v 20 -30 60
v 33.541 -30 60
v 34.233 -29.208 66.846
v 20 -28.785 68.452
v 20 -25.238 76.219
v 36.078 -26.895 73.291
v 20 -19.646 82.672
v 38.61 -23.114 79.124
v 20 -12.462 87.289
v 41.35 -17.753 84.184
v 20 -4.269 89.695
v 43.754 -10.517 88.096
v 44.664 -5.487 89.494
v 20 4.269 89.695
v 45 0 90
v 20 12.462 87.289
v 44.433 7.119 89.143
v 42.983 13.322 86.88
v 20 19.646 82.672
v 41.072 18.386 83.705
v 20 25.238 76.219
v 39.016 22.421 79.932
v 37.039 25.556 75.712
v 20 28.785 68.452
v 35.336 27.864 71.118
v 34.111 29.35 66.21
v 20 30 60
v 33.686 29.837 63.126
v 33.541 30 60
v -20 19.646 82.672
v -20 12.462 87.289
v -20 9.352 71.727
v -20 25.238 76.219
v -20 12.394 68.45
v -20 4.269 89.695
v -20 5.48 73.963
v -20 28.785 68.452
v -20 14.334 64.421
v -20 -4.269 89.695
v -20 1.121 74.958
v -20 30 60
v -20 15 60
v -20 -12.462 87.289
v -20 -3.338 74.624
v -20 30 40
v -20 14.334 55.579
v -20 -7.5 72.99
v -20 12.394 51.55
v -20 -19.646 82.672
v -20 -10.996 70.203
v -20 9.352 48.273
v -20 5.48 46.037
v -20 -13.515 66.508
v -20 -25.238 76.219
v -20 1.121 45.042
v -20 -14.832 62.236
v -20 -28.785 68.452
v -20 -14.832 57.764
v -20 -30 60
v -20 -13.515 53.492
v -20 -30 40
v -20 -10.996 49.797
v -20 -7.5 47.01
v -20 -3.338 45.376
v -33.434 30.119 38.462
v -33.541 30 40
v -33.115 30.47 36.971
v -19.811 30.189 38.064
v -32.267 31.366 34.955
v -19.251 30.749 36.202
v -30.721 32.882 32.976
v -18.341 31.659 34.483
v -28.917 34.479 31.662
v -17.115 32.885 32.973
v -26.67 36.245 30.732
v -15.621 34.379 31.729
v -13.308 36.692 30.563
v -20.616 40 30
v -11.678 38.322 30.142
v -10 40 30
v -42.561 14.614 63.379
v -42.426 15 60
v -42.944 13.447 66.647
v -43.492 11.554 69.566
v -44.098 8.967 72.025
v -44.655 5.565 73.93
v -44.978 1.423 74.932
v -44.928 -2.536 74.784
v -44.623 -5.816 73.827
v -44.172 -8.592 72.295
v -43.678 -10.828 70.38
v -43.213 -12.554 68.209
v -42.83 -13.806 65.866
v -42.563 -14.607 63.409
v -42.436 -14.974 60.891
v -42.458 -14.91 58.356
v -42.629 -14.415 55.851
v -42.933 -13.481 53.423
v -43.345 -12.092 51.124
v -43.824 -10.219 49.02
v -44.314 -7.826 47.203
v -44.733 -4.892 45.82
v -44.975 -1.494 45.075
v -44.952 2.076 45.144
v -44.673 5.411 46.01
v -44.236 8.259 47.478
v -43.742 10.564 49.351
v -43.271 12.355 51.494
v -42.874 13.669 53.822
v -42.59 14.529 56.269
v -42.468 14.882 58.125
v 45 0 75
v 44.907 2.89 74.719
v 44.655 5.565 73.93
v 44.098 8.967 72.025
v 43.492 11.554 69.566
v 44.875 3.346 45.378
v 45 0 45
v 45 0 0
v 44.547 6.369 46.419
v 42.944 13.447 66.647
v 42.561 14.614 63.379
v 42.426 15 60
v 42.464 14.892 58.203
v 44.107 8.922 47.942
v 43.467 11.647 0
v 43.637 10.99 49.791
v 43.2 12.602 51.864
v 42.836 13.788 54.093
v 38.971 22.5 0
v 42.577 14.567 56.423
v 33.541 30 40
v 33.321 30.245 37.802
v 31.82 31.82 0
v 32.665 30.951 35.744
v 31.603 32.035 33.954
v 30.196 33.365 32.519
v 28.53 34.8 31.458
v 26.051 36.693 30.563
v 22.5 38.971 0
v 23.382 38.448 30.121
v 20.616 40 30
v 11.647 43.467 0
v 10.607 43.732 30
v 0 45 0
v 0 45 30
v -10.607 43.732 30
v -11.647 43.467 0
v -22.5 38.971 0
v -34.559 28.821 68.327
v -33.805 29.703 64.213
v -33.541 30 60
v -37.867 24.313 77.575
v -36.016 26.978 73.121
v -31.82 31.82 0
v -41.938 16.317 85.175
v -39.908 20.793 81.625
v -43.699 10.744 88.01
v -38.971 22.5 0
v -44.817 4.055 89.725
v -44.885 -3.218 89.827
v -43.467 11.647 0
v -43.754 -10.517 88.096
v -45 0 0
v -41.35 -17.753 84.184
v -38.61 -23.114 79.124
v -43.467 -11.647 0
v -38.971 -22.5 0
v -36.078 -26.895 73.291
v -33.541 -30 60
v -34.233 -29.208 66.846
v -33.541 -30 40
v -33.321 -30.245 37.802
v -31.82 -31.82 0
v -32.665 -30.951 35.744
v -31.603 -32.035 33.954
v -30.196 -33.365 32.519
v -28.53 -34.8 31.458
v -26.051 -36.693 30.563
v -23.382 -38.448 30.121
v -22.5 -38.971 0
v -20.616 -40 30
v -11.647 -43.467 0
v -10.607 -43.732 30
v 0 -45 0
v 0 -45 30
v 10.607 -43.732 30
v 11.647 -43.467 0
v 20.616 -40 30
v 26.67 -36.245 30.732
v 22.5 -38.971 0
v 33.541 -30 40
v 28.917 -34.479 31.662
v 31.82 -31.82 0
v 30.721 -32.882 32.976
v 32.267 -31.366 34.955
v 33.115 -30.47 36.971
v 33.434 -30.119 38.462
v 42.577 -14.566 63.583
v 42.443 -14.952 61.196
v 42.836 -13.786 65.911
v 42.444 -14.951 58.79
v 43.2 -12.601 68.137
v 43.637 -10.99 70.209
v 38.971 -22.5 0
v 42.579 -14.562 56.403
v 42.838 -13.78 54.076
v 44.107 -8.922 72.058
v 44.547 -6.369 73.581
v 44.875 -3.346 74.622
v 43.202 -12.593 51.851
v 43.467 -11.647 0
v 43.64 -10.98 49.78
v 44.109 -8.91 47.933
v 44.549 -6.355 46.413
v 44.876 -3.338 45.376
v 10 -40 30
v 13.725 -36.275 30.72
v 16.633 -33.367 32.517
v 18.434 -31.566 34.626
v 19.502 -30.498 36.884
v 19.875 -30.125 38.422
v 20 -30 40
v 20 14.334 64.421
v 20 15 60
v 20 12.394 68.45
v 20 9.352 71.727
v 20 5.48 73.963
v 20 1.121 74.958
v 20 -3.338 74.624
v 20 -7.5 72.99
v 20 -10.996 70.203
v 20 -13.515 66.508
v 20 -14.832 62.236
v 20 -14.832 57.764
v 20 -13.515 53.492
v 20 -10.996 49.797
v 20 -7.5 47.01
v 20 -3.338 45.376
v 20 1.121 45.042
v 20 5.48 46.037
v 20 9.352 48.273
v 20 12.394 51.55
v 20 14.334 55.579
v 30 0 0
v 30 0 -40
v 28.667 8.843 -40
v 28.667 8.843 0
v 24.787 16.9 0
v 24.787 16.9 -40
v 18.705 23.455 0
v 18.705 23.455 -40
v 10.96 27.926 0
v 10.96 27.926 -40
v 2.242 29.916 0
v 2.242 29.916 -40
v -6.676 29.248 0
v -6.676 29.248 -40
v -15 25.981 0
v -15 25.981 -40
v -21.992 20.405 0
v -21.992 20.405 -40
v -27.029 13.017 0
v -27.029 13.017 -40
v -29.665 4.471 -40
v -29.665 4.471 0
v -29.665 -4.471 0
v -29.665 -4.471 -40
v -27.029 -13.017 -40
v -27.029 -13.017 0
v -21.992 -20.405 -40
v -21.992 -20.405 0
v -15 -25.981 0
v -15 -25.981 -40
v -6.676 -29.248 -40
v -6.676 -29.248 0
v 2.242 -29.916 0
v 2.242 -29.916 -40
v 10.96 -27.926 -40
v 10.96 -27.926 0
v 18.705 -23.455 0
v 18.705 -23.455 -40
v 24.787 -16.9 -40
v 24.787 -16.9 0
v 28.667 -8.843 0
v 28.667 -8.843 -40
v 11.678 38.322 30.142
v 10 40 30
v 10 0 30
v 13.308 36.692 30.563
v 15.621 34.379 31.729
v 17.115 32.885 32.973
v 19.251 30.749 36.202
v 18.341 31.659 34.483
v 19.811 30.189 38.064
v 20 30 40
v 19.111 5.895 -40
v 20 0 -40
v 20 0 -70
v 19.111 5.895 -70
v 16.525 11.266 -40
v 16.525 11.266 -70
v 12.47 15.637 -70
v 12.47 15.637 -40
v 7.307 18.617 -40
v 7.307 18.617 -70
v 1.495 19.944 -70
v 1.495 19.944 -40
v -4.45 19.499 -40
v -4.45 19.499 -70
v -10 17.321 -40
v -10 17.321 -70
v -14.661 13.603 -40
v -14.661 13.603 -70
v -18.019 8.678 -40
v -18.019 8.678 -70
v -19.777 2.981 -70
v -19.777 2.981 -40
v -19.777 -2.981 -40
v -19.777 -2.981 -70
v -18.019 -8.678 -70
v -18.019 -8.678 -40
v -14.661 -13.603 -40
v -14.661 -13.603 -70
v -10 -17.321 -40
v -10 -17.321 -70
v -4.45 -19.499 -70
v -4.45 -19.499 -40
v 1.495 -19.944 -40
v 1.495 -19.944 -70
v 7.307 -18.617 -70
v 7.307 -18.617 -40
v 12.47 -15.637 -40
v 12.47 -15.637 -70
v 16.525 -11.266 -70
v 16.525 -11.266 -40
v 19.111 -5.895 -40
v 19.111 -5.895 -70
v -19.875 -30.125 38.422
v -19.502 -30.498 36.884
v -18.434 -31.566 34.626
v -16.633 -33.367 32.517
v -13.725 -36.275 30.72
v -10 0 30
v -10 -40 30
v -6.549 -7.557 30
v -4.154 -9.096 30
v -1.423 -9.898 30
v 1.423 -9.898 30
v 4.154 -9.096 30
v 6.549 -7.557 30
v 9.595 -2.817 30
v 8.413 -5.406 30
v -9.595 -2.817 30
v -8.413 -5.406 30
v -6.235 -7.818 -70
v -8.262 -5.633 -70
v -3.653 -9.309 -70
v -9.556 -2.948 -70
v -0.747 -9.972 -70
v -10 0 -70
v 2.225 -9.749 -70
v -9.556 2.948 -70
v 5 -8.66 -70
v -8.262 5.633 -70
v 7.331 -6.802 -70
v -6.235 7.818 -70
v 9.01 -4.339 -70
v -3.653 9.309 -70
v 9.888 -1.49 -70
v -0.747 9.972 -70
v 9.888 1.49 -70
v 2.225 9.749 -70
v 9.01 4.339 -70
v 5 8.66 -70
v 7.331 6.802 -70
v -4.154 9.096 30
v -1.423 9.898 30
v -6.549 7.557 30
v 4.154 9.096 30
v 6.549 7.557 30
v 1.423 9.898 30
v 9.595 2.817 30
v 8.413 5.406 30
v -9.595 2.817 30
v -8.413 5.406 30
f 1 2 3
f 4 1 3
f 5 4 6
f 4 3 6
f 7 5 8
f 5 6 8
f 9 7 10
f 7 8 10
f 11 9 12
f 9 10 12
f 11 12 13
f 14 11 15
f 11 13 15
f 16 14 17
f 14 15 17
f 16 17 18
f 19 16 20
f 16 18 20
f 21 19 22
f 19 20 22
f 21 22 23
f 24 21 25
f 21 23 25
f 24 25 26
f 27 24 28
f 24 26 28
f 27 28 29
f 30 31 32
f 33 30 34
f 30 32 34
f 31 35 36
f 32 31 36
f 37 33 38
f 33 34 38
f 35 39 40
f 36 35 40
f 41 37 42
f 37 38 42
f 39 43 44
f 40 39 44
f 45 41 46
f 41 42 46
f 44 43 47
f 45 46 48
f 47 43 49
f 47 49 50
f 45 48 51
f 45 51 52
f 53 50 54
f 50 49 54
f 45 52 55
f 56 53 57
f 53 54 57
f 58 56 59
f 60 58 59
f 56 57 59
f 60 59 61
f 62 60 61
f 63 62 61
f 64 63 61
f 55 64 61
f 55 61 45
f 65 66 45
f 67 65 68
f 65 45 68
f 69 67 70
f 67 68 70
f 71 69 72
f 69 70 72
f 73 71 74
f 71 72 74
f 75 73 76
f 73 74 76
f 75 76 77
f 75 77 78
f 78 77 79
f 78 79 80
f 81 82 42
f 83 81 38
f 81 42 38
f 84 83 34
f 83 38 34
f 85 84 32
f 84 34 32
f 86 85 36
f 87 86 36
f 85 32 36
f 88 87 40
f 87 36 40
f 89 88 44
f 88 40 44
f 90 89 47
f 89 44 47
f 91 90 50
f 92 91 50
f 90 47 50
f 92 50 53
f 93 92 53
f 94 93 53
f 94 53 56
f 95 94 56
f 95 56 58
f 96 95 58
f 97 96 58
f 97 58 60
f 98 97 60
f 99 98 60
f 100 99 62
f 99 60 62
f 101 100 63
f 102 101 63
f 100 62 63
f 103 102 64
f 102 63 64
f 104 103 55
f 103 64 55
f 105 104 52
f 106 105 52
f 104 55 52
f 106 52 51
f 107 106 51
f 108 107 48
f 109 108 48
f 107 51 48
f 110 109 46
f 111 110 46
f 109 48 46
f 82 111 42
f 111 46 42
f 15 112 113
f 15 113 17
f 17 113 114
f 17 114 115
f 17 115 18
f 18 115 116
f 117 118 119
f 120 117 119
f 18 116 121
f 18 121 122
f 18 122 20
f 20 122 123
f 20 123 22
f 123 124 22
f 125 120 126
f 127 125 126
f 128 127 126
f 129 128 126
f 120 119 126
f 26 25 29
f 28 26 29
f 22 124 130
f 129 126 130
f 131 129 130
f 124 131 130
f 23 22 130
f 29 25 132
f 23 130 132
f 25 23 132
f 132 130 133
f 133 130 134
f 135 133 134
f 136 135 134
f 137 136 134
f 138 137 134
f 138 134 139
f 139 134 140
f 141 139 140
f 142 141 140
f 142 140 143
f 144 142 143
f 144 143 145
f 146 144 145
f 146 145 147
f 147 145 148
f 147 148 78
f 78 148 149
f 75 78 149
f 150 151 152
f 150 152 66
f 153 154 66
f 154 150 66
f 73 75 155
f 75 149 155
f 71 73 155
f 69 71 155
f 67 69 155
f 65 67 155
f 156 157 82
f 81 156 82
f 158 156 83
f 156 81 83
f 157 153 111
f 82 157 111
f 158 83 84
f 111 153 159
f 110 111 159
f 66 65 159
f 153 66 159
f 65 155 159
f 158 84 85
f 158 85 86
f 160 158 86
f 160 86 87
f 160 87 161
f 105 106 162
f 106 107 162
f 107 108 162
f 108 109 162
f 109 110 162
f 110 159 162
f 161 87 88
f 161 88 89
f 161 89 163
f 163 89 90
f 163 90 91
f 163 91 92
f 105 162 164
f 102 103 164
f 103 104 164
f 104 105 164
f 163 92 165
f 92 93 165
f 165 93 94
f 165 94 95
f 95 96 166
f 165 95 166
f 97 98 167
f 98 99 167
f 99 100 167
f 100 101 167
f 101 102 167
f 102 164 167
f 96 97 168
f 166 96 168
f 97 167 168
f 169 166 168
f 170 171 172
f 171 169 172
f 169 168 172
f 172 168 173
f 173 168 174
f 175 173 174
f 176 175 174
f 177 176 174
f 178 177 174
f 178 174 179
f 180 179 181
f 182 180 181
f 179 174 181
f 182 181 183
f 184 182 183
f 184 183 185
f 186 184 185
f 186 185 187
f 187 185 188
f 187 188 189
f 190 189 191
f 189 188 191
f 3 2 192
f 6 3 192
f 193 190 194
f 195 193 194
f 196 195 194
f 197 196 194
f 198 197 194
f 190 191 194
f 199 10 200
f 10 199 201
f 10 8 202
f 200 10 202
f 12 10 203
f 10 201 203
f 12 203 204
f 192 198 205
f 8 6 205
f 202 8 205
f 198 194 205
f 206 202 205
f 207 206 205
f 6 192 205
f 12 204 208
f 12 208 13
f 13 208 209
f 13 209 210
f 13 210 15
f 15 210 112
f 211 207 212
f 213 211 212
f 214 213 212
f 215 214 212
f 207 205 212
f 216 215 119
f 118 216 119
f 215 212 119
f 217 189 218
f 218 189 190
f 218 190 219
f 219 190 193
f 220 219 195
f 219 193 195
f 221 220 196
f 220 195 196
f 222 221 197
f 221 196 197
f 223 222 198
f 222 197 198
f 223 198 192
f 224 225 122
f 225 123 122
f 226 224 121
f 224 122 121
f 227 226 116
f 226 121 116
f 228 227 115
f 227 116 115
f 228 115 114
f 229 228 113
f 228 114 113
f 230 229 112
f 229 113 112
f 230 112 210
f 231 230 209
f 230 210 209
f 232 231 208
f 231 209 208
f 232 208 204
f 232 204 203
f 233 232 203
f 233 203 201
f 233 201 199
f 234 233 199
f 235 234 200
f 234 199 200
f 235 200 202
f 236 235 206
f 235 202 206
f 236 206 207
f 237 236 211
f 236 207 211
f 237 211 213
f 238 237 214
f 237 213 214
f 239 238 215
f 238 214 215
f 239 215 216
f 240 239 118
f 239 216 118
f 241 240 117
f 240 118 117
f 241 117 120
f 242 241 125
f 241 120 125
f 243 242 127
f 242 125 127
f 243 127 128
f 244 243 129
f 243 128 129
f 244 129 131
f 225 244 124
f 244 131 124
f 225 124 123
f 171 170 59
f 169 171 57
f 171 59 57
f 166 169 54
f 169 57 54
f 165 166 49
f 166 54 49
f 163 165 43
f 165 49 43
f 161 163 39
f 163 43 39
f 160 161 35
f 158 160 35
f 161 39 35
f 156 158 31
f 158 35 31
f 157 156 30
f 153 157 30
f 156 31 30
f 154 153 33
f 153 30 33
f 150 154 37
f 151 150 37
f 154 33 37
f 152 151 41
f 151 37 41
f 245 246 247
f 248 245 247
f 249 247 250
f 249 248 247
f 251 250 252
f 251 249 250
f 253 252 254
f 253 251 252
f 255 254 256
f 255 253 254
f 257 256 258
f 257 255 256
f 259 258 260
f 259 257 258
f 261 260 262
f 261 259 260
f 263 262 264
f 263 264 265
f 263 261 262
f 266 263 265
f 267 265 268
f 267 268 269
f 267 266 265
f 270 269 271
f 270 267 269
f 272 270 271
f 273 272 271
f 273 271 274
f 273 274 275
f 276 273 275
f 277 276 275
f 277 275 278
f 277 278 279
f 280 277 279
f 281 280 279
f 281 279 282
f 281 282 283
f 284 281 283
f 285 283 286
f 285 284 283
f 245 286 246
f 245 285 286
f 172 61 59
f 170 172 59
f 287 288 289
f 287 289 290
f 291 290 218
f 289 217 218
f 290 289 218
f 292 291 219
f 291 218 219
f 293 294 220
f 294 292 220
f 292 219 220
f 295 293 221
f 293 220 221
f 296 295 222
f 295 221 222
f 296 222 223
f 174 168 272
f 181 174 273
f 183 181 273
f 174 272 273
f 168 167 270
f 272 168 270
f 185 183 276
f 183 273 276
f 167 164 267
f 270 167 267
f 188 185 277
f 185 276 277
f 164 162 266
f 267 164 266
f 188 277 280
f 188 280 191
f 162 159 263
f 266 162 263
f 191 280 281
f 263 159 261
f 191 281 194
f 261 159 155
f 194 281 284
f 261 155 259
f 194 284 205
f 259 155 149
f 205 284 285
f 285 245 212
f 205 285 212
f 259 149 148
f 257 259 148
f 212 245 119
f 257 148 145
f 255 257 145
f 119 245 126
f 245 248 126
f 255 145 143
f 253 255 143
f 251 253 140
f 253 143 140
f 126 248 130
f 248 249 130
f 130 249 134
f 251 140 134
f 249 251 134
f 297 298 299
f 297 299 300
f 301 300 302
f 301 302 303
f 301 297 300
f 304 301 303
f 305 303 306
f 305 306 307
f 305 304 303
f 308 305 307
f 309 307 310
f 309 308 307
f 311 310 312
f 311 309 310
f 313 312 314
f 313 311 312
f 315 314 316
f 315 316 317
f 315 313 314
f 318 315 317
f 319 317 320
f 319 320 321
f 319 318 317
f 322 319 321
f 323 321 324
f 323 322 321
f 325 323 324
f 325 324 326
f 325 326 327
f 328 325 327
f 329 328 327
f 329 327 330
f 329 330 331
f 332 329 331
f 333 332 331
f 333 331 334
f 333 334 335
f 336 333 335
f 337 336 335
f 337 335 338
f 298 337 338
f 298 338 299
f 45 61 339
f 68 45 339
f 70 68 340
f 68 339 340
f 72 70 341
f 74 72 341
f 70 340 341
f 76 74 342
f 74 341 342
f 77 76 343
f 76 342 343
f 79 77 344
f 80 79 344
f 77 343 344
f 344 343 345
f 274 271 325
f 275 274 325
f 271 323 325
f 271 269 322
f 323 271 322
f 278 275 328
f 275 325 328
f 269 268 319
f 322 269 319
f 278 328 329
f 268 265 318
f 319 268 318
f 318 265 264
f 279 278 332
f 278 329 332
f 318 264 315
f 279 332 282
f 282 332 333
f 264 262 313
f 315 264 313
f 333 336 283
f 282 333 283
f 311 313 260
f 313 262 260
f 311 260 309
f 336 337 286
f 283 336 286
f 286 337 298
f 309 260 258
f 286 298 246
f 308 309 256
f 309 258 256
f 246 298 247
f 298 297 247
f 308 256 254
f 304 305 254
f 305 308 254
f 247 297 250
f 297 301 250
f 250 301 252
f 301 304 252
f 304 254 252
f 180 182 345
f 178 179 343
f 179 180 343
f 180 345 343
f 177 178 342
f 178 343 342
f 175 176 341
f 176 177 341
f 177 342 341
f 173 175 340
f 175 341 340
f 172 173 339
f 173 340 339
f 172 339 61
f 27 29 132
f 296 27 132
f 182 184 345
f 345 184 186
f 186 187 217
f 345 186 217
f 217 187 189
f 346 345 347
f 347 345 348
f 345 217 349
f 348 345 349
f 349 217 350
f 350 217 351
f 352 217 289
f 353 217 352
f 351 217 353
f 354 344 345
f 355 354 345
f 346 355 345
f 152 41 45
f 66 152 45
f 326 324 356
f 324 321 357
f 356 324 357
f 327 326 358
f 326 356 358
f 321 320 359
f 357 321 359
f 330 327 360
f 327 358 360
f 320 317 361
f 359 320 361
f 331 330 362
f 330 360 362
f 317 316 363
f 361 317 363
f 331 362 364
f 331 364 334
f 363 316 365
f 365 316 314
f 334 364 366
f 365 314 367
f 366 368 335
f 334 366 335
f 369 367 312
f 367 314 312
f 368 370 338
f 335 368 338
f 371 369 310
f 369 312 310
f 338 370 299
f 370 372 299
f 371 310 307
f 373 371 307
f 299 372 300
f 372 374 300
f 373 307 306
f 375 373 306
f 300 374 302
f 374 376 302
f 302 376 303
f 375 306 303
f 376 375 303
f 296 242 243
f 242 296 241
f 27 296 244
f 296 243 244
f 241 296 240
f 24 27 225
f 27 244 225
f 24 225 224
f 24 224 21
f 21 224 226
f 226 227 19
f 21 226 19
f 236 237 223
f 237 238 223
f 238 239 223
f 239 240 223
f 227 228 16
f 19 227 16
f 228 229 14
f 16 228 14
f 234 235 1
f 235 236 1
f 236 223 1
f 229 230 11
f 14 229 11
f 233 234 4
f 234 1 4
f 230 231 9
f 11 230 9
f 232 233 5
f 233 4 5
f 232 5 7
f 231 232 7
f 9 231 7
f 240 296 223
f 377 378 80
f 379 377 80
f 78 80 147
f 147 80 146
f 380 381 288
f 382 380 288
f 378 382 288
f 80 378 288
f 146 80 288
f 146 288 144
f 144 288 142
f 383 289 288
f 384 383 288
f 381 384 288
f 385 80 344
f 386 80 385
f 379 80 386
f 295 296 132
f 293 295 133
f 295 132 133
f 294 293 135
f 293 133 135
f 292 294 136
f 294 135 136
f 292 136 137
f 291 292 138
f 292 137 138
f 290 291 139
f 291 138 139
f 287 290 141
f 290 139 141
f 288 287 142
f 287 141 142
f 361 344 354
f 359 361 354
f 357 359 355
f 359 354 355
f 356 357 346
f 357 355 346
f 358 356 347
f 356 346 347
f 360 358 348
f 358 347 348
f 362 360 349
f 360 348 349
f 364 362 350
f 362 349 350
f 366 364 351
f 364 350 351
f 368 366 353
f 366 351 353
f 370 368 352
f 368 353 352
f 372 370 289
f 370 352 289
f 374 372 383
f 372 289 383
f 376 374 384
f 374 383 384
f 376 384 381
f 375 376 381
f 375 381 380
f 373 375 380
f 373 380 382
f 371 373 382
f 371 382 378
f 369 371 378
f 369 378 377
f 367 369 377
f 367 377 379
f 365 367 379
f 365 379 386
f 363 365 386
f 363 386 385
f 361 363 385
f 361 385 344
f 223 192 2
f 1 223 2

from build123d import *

# Parameters (mm, degrees)
F0_R     = 45
F0_R_2   = 30
F0_R_3   = 20
F1_DEPTH = 90
F2_DEPTH = 70
F3_DEPTH = 40
F5_DEPTH = 50
F4_R     = 15
F6_DEPTH = 50
F8_DEPTH = 50
F10_D    = 20


with BuildPart() as f1:
    # F0 (on Top) → F1 (new body)
    with BuildSketch(Plane.XY):
        Circle(F0_R)
        Circle(F0_R_2, mode=Mode.SUBTRACT)
        Circle(F0_R_2)
        Circle(F0_R_3, mode=Mode.SUBTRACT)
        Circle(F0_R_3)
    extrude(amount=F1_DEPTH)

    # F0 (on Top) → F2 (join)
    with BuildSketch(Plane.XY):
        Circle(F0_R_3)
    extrude(amount=-F2_DEPTH)

    # F0 (on Top) → F3 (join)
    with BuildSketch(Plane.XY):
        Circle(F0_R_2)
        Circle(F0_R_3, mode=Mode.SUBTRACT)
    extrude(amount=-F3_DEPTH)

    # F4 (on Right) → F5 (cut, symmetric)
    with BuildSketch(Plane.YZ):
        with BuildLine():
            Line((-82.7872549732, 115.9372627735), (-82.7872549732, 30))
            Line((-82.7872549732, 30), (-40, 30))
            ThreePointArc((-40, 30), (-32.9289321881, 32.9289321881), (-30, 40))
            Line((-30, 40), (-30, 60))
            ThreePointArc((-30, 60), (0, 90), (30, 60))
            Line((30, 60), (30, 40))
            ThreePointArc((30, 40), (32.9289321881, 32.9289321881), (40, 30))
            Line((40, 30), (82.7872549732, 30))
            Line((82.7872549732, 30), (82.7872549732, 115.9372627735))
            Line((82.7872549732, 115.9372627735), (-82.7872549732, 115.9372627735))
        make_face()
    extrude(amount=F5_DEPTH, both=True, mode=Mode.SUBTRACT)

    # F4 (on Right) → F6 (cut, symmetric)
    with BuildSketch(Plane.YZ):
        with Locations((0, 60)):
            Circle(F4_R)
    extrude(amount=F6_DEPTH, both=True, mode=Mode.SUBTRACT)

    # F7 (on Front) → F8 (cut, symmetric)
    with BuildSketch(Plane.XZ):
        with BuildLine():
            Line((20, 128.1329473248), (-20, 128.1329473248))
            Line((-20, 128.1329473248), (-20, 40))
            ThreePointArc((-20, 40), (-17.0710678119, 32.9289321881), (-10, 30))
            Line((-10, 30), (10, 30))
            ThreePointArc((10, 30), (17.0710678119, 32.9289321881), (20, 40))
            Line((20, 40), (20, 128.1329473248))
        make_face()
    extrude(amount=F8_DEPTH, both=True, mode=Mode.SUBTRACT)

    # F10 (through all)
    with Locations(Plane(origin=(0, 0, -70), x_dir=(1, 0, 0), z_dir=(0, 0, -1))):
        with Locations((0, 0)):
            Hole(F10_D / 2)


solid = f1.part
